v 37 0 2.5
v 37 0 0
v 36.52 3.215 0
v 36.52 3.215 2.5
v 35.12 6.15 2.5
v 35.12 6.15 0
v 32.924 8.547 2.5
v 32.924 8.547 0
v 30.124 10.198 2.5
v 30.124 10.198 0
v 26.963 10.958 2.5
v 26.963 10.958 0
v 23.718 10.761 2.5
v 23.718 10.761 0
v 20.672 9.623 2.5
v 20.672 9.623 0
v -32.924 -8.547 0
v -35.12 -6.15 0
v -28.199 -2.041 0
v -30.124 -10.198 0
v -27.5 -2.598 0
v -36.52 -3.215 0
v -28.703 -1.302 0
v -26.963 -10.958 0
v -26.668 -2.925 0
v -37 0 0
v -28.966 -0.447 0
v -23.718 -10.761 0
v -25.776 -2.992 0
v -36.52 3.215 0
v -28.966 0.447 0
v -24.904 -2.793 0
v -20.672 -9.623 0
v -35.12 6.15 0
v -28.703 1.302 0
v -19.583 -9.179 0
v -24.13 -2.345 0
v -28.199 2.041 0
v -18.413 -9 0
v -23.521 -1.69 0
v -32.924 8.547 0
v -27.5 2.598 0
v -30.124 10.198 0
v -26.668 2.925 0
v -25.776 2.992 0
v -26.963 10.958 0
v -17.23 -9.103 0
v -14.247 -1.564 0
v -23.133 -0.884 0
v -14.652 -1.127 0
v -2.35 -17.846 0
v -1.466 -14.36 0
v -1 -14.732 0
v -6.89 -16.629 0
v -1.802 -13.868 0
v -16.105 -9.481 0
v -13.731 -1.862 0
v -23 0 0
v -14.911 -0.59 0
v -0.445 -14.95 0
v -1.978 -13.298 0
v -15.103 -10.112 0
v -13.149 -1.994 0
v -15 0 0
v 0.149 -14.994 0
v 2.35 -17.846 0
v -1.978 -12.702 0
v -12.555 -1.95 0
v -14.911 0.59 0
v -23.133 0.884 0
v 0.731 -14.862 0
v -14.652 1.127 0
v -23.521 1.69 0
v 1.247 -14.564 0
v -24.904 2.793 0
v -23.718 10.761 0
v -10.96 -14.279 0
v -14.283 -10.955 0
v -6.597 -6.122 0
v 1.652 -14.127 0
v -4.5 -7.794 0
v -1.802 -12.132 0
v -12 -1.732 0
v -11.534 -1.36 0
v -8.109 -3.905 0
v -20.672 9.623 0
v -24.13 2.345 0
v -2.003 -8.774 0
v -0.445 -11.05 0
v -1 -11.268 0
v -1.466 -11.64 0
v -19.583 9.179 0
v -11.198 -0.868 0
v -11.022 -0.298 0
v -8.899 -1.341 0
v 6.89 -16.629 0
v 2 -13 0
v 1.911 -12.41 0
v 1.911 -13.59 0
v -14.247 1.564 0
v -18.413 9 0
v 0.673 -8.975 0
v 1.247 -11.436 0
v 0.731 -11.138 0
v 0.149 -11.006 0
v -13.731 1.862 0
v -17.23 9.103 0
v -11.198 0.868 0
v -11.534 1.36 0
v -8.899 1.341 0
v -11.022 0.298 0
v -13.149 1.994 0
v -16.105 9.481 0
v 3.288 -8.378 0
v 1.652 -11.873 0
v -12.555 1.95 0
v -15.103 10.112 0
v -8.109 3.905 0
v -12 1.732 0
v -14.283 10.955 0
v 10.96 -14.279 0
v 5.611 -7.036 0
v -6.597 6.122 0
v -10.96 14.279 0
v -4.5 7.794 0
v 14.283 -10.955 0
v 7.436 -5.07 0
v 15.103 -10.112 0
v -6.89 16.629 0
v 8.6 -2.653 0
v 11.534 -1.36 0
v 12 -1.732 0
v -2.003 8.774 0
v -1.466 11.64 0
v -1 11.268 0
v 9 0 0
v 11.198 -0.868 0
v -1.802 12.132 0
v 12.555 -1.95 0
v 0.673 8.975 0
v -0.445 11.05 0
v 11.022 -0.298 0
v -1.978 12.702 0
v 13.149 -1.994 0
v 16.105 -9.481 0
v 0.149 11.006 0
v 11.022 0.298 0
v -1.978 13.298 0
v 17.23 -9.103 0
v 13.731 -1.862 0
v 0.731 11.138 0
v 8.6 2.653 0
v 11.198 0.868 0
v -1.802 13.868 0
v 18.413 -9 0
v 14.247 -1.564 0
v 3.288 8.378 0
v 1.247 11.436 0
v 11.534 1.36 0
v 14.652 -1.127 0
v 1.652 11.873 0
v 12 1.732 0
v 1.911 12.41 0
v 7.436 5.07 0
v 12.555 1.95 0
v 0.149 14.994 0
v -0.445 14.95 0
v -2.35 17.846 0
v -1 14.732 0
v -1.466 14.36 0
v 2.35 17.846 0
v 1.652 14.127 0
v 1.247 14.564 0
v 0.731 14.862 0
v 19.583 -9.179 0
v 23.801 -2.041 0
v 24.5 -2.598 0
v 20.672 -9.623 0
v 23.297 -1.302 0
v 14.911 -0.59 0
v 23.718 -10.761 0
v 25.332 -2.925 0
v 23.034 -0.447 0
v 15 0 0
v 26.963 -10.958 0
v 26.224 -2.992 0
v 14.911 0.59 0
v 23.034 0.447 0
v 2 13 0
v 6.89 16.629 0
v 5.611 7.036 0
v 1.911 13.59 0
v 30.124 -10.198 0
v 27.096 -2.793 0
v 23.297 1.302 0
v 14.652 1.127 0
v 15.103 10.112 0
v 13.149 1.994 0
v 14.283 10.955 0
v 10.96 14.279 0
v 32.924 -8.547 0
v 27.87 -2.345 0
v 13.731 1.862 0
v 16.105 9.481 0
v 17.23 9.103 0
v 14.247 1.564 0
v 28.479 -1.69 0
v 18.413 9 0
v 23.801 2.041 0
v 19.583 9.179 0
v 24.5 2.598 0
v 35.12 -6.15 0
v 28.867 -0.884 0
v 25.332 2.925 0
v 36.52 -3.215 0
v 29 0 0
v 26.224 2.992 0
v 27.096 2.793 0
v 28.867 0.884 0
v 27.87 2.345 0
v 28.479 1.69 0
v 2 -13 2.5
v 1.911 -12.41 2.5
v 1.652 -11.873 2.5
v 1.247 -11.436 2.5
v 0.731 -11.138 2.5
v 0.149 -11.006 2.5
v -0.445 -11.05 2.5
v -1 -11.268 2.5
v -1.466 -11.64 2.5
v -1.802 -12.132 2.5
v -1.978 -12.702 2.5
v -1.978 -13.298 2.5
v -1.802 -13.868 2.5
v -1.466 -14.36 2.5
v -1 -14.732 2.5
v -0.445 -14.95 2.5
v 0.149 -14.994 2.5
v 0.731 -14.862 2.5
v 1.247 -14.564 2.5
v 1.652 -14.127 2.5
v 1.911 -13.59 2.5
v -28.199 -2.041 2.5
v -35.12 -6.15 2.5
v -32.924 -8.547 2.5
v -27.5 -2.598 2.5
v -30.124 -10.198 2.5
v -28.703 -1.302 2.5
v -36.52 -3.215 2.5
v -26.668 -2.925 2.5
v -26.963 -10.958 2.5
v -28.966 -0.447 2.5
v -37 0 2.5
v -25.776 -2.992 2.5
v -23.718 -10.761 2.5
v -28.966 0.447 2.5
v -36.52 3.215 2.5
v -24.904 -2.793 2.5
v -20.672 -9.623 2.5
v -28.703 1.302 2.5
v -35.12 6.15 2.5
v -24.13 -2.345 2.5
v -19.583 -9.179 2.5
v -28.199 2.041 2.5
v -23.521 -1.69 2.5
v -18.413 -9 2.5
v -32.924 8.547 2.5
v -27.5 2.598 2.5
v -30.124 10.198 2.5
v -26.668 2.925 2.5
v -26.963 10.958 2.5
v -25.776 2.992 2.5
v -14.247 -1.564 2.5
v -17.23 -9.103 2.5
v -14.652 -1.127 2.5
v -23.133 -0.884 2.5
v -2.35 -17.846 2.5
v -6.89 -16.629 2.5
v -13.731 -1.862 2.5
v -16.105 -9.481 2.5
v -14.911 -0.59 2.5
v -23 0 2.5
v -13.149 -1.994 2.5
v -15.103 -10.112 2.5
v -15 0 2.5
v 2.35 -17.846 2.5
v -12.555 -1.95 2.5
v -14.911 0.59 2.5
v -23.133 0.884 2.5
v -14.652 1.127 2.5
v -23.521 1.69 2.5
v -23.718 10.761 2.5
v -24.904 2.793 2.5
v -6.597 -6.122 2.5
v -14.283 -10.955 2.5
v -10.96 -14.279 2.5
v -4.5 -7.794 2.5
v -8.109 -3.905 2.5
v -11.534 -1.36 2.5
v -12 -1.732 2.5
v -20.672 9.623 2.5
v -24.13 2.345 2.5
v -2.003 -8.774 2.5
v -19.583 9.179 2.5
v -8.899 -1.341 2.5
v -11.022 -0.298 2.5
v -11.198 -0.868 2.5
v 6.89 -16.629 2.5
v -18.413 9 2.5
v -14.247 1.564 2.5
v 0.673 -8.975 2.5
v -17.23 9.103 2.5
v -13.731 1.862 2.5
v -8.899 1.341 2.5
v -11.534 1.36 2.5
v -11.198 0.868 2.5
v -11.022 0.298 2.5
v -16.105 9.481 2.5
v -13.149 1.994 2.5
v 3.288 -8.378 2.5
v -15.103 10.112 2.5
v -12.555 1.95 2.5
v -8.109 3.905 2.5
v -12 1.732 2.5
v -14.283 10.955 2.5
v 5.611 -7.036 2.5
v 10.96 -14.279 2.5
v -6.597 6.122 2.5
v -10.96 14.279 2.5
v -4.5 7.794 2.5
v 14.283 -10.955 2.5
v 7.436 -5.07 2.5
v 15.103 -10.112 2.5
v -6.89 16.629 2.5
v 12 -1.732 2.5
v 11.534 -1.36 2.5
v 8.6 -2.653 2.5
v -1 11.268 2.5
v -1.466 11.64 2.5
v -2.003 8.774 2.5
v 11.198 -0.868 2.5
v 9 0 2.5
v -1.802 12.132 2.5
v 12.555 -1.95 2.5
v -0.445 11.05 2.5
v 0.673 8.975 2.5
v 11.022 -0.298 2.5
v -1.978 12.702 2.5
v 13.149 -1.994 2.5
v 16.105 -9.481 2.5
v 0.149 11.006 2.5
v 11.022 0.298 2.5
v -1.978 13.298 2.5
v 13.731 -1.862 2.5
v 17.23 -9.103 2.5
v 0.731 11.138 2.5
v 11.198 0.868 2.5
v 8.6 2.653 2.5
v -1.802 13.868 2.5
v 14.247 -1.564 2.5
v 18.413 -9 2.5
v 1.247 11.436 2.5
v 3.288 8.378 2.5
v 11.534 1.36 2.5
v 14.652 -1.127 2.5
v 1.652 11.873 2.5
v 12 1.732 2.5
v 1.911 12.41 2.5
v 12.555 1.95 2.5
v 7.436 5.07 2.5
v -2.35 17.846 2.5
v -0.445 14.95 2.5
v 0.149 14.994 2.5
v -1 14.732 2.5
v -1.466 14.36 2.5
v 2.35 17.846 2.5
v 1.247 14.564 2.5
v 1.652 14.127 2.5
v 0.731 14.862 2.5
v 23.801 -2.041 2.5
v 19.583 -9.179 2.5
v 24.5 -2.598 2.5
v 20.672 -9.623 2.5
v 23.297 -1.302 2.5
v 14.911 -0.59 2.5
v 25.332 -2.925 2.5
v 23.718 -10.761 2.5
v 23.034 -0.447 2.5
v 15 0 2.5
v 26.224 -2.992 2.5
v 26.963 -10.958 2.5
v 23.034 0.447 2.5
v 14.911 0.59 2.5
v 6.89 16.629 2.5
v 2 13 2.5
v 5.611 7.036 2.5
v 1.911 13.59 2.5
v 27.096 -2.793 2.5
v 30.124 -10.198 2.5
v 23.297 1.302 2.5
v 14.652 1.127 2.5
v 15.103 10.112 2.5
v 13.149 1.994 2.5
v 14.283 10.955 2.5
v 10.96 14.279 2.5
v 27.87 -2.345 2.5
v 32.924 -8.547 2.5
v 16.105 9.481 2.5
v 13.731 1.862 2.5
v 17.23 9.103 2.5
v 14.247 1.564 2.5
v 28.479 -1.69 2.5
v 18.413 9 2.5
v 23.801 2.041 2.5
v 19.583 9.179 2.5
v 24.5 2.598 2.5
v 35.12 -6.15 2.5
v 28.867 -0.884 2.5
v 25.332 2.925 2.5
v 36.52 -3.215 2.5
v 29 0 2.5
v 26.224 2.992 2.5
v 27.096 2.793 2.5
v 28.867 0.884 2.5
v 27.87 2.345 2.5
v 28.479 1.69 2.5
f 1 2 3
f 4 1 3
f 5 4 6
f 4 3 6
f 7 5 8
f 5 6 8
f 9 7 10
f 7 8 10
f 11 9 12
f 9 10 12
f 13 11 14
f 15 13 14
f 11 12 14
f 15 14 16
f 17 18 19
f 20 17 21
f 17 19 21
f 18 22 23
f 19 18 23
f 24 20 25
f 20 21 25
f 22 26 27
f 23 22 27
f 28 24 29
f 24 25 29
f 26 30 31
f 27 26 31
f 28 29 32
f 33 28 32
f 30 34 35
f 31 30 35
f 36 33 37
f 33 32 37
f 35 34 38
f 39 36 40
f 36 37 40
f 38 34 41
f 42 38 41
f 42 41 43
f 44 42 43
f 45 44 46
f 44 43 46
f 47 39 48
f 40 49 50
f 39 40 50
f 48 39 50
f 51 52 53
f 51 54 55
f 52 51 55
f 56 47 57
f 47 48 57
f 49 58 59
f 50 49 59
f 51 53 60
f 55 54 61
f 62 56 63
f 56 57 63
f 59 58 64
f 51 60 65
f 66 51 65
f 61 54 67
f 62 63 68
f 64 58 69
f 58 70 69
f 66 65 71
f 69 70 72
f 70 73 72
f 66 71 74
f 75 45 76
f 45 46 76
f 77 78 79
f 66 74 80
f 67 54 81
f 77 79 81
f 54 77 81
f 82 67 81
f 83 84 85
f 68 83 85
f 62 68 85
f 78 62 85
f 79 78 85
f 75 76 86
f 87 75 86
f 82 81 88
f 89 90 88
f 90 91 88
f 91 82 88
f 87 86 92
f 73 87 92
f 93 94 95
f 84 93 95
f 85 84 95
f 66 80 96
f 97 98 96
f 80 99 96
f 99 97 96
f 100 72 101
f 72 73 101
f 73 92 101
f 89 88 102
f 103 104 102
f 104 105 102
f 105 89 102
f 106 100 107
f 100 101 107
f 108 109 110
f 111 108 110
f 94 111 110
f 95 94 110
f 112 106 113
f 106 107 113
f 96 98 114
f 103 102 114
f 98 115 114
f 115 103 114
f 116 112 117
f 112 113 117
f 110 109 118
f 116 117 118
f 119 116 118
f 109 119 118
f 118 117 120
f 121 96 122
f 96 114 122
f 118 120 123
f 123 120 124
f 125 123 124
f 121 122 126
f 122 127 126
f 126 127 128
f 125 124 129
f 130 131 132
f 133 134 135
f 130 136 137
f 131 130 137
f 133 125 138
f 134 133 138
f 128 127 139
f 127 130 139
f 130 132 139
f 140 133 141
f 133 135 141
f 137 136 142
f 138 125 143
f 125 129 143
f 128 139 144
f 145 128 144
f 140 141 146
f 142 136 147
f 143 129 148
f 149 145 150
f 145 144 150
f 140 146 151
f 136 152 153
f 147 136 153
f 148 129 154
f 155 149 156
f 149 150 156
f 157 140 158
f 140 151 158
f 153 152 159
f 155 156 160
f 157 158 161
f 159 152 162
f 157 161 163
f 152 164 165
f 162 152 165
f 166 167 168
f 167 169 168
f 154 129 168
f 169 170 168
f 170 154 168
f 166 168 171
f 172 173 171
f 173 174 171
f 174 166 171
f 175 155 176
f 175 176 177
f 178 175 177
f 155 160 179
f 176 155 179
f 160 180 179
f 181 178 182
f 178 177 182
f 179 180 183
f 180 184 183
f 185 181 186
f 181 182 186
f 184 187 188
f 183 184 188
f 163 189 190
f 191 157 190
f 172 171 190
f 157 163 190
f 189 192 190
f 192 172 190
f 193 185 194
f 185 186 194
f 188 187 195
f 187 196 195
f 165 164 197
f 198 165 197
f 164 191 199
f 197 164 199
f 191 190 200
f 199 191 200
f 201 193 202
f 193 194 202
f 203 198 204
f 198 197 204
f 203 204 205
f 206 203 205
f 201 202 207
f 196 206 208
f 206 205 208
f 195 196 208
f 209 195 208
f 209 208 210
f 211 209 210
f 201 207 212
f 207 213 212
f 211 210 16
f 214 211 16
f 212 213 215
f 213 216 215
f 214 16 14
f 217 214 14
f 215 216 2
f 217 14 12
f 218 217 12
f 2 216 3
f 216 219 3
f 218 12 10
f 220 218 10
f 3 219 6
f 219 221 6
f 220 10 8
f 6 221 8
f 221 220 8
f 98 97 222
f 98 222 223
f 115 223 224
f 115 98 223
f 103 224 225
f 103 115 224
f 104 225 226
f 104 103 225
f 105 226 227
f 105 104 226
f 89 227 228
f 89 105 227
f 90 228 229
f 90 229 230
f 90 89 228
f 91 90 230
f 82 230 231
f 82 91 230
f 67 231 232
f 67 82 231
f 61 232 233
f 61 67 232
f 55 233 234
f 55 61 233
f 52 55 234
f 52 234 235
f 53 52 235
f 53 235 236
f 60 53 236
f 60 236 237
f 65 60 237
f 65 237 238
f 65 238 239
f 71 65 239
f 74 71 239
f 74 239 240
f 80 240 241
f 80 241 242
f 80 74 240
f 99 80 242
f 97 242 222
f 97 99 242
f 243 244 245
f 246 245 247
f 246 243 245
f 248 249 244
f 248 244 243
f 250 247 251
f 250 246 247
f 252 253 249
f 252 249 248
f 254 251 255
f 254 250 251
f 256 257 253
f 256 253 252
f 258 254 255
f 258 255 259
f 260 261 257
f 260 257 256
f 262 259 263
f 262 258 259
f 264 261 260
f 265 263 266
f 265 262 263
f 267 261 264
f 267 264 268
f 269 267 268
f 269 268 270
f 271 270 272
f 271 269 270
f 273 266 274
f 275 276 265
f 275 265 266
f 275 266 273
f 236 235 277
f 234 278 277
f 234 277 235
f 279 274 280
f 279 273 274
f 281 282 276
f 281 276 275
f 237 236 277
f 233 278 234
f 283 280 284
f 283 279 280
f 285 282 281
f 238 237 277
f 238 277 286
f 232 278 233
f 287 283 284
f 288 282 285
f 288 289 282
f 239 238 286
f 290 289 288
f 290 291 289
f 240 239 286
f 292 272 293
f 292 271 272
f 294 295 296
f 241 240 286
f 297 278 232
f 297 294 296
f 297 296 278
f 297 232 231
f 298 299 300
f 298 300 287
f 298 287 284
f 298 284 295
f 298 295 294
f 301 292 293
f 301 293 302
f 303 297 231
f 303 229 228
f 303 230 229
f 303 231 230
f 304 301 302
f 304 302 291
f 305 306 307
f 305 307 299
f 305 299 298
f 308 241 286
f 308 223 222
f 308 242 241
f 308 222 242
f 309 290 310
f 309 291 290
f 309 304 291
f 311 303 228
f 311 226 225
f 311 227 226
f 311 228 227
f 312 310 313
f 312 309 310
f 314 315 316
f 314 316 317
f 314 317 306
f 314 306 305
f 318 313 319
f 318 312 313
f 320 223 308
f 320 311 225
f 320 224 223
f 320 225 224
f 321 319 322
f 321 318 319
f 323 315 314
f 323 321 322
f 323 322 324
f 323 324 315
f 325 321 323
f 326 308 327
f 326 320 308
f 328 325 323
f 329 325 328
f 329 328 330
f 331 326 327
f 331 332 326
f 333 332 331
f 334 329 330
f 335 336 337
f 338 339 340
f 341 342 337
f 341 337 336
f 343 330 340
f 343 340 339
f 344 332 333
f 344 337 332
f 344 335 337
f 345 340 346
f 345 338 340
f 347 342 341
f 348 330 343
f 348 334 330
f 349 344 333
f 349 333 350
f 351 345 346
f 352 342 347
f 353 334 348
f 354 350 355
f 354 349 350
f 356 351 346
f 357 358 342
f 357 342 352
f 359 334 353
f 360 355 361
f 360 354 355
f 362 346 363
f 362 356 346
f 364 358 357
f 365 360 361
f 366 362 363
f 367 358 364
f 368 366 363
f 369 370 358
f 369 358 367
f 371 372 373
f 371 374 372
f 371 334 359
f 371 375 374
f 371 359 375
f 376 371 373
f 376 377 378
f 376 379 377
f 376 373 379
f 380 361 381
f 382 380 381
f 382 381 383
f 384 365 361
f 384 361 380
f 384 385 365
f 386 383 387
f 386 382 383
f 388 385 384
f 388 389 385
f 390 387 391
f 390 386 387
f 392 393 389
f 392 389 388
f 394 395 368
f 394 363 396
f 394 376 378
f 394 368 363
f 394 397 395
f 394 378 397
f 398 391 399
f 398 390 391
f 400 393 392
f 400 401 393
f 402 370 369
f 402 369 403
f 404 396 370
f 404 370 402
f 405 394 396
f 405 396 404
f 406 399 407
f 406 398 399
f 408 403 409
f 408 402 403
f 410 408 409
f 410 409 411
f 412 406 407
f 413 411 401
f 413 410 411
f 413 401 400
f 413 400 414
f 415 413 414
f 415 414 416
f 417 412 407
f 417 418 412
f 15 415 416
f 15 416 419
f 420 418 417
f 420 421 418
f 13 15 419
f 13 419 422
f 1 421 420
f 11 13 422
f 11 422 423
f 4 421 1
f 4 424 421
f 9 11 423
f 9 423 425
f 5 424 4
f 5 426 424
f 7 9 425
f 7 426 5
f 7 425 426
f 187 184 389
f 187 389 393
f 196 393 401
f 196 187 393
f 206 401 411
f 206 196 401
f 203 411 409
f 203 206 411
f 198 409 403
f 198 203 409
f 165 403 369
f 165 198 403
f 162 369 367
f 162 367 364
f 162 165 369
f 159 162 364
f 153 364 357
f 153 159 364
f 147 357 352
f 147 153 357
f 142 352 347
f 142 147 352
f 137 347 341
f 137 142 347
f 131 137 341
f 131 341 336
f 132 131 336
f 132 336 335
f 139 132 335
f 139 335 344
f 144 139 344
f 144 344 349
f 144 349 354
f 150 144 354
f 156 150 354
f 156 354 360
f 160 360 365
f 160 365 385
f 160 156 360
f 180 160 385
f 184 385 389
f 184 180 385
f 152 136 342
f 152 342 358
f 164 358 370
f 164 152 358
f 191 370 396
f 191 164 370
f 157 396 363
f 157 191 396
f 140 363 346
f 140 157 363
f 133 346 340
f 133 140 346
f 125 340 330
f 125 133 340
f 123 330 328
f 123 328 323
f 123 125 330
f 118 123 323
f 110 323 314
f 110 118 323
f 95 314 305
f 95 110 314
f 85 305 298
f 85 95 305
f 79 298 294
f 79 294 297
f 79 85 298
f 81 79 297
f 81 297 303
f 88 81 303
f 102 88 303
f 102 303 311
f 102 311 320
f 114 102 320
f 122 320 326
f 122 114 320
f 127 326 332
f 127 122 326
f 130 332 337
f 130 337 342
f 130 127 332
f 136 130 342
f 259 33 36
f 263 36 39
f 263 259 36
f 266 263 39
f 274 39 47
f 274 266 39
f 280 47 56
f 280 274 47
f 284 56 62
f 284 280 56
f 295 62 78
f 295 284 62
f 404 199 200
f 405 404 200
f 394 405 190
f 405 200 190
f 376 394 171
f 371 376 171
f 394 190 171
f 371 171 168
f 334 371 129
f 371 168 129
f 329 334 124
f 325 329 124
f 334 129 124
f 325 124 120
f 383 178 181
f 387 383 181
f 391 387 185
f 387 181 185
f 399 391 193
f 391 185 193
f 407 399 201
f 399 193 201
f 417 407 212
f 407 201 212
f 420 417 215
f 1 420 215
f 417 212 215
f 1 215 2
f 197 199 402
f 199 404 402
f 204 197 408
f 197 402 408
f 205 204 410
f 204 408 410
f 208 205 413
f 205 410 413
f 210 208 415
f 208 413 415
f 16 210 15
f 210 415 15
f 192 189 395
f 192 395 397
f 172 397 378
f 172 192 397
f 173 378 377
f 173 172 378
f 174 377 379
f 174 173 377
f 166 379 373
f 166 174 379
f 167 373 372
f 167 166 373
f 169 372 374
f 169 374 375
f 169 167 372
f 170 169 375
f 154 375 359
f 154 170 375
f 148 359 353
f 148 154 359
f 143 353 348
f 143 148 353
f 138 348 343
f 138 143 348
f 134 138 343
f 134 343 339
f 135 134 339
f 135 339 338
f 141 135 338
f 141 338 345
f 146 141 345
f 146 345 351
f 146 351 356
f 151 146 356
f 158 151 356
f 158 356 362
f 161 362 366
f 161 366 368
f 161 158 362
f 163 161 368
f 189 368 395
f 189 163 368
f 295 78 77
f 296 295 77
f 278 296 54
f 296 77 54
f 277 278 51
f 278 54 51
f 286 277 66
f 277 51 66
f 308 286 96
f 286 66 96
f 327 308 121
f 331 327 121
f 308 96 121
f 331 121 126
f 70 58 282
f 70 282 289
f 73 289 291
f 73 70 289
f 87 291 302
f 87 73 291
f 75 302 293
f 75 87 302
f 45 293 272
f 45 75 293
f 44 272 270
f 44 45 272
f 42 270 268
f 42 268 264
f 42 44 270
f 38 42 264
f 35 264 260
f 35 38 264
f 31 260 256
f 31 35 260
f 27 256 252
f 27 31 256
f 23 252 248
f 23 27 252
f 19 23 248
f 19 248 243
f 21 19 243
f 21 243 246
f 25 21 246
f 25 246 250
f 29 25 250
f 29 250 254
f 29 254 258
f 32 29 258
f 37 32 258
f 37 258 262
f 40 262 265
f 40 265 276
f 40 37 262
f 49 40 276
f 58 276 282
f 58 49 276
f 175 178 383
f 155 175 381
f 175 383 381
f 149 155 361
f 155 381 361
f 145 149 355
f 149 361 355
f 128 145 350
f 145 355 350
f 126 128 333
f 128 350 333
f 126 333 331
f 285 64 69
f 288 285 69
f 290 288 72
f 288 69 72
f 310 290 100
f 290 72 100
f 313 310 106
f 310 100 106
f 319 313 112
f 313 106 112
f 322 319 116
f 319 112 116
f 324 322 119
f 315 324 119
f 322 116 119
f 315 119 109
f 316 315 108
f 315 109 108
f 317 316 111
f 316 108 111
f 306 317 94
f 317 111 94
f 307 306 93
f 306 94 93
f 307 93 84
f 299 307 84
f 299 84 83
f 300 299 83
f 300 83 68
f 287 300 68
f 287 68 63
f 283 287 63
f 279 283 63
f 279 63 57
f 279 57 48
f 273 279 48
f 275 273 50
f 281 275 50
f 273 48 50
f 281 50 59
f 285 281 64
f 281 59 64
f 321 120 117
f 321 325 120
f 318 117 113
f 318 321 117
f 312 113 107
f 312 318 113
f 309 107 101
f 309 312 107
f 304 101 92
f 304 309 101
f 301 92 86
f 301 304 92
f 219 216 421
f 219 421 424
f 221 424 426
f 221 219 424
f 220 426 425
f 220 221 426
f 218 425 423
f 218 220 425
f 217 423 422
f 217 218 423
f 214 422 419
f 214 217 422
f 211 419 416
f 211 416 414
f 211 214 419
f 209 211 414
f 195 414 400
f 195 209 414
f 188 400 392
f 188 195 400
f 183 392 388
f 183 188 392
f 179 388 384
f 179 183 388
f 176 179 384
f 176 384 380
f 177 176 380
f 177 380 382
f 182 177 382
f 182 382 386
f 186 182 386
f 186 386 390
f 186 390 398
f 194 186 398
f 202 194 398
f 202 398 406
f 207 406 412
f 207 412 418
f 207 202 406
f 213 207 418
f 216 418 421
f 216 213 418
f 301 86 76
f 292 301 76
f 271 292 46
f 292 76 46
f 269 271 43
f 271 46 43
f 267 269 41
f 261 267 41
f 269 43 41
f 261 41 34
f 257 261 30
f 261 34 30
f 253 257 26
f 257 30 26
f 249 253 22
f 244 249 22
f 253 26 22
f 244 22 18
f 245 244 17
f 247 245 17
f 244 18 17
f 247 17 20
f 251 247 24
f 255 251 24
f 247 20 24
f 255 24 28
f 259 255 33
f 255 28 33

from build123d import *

# Parameters (mm, degrees)
F0_R     = 3
F0_R_2   = 2
F0_R_3   = 9
F1_DEPTH = 2.5
F2_R     = 5


with BuildPart() as f1:
    # F0 (on Top) → F1 (new body)
    with BuildSketch(Plane.XY):
        with BuildLine():
            ThreePointArc((16.9038461538, -6.1854656419), (17.7238431325, -3.140920982), (18, 0))
            ThreePointArc((18, 0), (17.7238431325, 3.140920982), (16.9038461538, 6.1854656419))
            ThreePointArc((16.9038461538, 6.1854656419), (15.4867299971, 3.2359162298), (15, 0))
            ThreePointArc((15, 0), (15.4867299971, -3.2359162298), (16.9038461538, -6.1854656419))
        make_face()
        with BuildLine():
            ThreePointArc((16.9038461538, 6.1854656419), (17.7238431325, 3.140920982), (18, 0))
            ThreePointArc((18, 0), (17.7238431325, -3.140920982), (16.9038461538, -6.1854656419))
            ThreePointArc((16.9038461538, -6.1854656419), (29.2359162298, -10.5132700029), (37, 0))
            ThreePointArc((37, 0), (29.2359162298, 10.5132700029), (16.9038461538, 6.1854656419))
        make_face()
        with Locations((26, 0)):
            Circle(F0_R, mode=Mode.SUBTRACT)
        with BuildLine():
            ThreePointArc((15, 0), (15.4867299971, 3.2359162298), (16.9038461538, 6.1854656419))
            ThreePointArc((16.9038461538, 6.1854656419), (0, 18), (-16.9038461538, 6.1854656419))
            ThreePointArc((-16.9038461538, 6.1854656419), (-15.4867299971, 3.2359162298), (-15, 0))
            ThreePointArc((-15, 0), (-15.4867299971, -3.2359162298), (-16.9038461538, -6.1854656419))
            ThreePointArc((-16.9038461538, -6.1854656419), (0, -18), (16.9038461538, -6.1854656419))
            ThreePointArc((16.9038461538, -6.1854656419), (15.4867299971, -3.2359162298), (15, 0))
        make_face()
        with Locations((0, -13)):
            Circle(F0_R_2, mode=Mode.SUBTRACT)
        with BuildLine():
            ThreePointArc((-11, 0), (-13, -2), (-15, 0))
            ThreePointArc((-15, 0), (-13, 2), (-11, 0))
        make_face(mode=Mode.SUBTRACT)
        Circle(F0_R_3, mode=Mode.SUBTRACT)
        with Locations((13, 0)):
            Circle(F0_R_2, mode=Mode.SUBTRACT)
        with Locations((0, 13)):
            Circle(F0_R_2, mode=Mode.SUBTRACT)
        with BuildLine():
            ThreePointArc((-15, 0), (-15.4867299971, 3.2359162298), (-16.9038461538, 6.1854656419))
            ThreePointArc((-16.9038461538, 6.1854656419), (-18, 0), (-16.9038461538, -6.1854656419))
            ThreePointArc((-16.9038461538, -6.1854656419), (-15.4867299971, -3.2359162298), (-15, 0))
        make_face()
        with BuildLine():
            ThreePointArc((-16.9038461538, -6.1854656419), (-18, 0), (-16.9038461538, 6.1854656419))
            ThreePointArc((-16.9038461538, 6.1854656419), (-37, 0), (-16.9038461538, -6.1854656419))
        make_face()
        with Locations((-26, 0)):
            Circle(F0_R, mode=Mode.SUBTRACT)
    extrude(amount=F1_DEPTH)

    # F2
    f2_edges = [f1.edges().sort_by_distance(p)[0] for p in [
        (16.903846, 6.185466, 1.25),
        (-16.903846, 6.185466, 1.25),
        (16.903846, -6.185466, 1.25),
        (-16.903846, -6.185466, 1.25),
    ]]
    fillet(f2_edges, radius=F2_R)


solid = f1.part
